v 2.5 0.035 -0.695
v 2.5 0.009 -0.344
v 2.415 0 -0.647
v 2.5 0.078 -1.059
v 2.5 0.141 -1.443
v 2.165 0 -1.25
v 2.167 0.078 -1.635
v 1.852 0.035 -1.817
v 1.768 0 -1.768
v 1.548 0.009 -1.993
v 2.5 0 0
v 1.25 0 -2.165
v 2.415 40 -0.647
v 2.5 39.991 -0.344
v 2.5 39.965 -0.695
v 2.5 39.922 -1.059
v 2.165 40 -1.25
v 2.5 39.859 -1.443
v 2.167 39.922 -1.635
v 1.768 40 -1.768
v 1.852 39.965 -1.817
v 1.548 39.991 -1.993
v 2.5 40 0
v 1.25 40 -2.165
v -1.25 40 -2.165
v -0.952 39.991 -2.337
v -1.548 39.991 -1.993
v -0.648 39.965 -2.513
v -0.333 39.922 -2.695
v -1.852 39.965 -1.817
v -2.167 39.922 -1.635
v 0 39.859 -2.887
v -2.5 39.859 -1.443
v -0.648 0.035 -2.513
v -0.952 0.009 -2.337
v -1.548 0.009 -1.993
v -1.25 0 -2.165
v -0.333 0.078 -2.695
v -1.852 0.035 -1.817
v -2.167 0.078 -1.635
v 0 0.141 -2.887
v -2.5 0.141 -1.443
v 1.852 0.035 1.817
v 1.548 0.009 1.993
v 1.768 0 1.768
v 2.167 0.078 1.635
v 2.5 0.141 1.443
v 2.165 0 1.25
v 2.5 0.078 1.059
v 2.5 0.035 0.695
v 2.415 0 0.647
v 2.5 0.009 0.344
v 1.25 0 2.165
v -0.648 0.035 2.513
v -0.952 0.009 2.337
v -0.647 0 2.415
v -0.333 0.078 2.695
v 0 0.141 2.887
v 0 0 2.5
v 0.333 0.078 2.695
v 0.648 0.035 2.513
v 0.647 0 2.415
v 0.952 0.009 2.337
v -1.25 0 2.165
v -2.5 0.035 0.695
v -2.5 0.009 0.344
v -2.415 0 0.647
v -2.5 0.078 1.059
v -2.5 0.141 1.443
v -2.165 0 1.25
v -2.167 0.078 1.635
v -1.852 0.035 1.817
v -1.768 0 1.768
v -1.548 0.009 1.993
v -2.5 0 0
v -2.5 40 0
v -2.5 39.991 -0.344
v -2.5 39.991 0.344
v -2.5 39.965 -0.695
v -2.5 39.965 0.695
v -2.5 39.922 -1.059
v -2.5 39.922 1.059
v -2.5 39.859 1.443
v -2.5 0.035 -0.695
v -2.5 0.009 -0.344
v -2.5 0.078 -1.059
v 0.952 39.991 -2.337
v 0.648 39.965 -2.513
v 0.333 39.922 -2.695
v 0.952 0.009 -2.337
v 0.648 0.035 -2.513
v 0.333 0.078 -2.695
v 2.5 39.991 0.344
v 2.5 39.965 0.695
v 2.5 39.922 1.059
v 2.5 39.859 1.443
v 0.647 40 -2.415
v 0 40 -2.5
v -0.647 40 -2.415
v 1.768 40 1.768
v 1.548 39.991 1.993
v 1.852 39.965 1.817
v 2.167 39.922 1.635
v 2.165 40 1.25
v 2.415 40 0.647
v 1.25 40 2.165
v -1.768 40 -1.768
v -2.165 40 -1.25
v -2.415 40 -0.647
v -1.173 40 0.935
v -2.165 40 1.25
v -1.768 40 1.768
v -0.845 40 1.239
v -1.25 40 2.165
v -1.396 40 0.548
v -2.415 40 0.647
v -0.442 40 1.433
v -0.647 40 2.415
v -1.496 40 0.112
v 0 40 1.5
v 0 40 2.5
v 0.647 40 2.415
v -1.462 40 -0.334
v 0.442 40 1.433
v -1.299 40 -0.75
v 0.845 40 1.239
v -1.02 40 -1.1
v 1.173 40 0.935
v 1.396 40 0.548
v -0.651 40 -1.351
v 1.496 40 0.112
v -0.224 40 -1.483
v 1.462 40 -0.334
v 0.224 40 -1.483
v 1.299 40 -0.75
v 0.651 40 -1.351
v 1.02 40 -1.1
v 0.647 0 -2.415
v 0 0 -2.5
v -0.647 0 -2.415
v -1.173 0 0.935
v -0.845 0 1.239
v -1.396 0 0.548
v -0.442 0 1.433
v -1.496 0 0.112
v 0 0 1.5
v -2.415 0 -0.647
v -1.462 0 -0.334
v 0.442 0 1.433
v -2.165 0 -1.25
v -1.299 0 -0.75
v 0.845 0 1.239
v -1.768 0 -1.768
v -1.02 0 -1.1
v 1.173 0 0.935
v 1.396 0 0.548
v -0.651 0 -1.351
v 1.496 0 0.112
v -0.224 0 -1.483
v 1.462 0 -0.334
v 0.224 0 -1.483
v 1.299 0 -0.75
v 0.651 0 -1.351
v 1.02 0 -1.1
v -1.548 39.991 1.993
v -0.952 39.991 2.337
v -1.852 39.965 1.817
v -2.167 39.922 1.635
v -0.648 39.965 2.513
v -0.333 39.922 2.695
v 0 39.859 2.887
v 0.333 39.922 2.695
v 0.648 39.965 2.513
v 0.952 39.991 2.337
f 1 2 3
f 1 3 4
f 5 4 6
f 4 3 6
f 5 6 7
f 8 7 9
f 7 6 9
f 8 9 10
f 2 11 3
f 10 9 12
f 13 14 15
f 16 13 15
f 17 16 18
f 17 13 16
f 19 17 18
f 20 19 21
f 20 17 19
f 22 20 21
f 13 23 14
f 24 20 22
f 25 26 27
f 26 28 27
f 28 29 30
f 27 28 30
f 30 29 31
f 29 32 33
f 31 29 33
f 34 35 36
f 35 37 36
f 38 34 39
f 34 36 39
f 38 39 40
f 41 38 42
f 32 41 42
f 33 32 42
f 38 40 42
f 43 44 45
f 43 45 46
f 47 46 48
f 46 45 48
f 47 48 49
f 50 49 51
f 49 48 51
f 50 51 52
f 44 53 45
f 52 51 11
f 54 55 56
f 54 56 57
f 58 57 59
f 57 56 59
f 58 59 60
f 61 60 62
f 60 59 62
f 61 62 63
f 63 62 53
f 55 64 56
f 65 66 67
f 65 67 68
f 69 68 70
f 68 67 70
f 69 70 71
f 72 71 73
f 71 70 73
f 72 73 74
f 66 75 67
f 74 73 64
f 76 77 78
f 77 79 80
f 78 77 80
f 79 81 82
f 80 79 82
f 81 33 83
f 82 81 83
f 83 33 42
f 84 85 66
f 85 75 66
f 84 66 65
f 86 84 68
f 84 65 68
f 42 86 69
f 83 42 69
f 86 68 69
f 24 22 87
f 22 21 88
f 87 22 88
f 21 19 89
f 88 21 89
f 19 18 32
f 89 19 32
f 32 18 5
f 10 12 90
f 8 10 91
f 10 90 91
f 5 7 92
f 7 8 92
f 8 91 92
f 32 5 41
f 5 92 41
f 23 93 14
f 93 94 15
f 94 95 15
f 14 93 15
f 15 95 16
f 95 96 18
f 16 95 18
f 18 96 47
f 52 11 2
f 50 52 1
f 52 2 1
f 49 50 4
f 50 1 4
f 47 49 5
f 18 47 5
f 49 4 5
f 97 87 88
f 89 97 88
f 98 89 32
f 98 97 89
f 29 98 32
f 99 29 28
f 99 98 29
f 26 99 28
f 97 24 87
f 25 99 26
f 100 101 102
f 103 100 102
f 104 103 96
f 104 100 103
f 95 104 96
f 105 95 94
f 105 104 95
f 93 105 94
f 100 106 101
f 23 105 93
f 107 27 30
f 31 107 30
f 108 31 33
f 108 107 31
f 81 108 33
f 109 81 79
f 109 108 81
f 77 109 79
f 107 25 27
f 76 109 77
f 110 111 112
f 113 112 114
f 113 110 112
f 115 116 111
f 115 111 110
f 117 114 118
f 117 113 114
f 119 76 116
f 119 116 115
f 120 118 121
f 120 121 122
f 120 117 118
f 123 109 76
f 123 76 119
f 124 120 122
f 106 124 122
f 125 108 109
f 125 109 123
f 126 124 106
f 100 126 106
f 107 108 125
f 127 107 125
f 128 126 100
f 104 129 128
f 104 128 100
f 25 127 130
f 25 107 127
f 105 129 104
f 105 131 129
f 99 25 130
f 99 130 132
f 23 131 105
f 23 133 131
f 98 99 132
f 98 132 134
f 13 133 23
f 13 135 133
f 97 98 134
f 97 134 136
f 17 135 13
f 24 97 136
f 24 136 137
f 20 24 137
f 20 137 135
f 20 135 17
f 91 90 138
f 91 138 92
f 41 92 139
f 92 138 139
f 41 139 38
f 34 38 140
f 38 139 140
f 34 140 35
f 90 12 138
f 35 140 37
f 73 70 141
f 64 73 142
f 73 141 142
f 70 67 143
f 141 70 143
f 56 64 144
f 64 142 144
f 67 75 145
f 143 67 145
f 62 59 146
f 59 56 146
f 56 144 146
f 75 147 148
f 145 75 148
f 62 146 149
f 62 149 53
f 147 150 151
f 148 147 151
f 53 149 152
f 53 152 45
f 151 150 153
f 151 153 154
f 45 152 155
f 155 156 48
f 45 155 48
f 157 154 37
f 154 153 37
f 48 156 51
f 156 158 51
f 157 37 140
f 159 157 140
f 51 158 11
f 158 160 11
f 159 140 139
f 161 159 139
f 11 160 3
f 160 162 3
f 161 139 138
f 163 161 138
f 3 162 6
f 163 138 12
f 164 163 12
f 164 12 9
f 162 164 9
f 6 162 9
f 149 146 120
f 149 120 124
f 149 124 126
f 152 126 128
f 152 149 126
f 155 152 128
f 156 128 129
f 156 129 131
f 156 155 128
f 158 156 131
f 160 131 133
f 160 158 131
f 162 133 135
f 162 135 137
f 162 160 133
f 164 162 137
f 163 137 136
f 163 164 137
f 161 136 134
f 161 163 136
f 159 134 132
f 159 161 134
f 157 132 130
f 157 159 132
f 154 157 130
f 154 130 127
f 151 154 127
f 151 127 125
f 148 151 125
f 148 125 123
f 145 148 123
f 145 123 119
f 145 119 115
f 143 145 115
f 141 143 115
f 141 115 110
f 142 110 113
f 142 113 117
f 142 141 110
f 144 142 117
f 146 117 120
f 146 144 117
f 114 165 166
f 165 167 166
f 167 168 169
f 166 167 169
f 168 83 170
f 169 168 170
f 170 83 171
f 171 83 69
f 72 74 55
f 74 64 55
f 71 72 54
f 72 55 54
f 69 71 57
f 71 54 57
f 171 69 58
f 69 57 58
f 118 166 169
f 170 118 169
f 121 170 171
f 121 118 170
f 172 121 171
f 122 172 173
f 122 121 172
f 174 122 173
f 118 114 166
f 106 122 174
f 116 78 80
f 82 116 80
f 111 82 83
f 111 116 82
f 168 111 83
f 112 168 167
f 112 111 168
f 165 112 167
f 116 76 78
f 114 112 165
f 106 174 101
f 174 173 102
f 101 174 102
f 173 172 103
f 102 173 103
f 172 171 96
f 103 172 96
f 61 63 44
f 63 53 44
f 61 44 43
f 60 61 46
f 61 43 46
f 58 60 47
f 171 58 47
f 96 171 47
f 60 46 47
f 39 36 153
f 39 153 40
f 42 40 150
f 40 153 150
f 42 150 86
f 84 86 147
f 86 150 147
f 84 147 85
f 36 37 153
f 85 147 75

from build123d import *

# Parameters (mm, degrees)
SKETCH1_R           = 1.5
BOSS_EXTRUDE1_DEPTH = 40


with BuildPart() as part:
    # Sketch1 → Boss-Extrude1 (new body)
    with BuildSketch(Plane(origin=(0, 0, 0), x_dir=(1, 0, 0), z_dir=(0, 1, 0))):
        Polygon((0, 2.886751346), (-2.5, 1.443375673), (-2.5, -1.443375673), (0, -2.886751346), (2.5, -1.443375673), (2.5, 1.443375673), align=None)
        with Locations(Location((0, 0, 0), (0, 0, 270))):
            Circle(SKETCH1_R, mode=Mode.SUBTRACT)
    extrude(amount=BOSS_EXTRUDE1_DEPTH)

    # Sketch6 → Cut-Revolve1 (revolve, cut)
    with BuildSketch(Plane.ZY):
        Polygon((2.5, 40), (2.886751346, 40), (2.886751346, 39.859234022), align=None)
    cut_revolve1 = revolve(axis=Axis((0, 40, 0), (0, 1, 0)), mode=Mode.SUBTRACT)

    # Mirror1: Cut-Revolve1 across plane
    add(cut_revolve1.mirror(Plane.ZX.offset(20)), mode=Mode.SUBTRACT)


solid = part.part
